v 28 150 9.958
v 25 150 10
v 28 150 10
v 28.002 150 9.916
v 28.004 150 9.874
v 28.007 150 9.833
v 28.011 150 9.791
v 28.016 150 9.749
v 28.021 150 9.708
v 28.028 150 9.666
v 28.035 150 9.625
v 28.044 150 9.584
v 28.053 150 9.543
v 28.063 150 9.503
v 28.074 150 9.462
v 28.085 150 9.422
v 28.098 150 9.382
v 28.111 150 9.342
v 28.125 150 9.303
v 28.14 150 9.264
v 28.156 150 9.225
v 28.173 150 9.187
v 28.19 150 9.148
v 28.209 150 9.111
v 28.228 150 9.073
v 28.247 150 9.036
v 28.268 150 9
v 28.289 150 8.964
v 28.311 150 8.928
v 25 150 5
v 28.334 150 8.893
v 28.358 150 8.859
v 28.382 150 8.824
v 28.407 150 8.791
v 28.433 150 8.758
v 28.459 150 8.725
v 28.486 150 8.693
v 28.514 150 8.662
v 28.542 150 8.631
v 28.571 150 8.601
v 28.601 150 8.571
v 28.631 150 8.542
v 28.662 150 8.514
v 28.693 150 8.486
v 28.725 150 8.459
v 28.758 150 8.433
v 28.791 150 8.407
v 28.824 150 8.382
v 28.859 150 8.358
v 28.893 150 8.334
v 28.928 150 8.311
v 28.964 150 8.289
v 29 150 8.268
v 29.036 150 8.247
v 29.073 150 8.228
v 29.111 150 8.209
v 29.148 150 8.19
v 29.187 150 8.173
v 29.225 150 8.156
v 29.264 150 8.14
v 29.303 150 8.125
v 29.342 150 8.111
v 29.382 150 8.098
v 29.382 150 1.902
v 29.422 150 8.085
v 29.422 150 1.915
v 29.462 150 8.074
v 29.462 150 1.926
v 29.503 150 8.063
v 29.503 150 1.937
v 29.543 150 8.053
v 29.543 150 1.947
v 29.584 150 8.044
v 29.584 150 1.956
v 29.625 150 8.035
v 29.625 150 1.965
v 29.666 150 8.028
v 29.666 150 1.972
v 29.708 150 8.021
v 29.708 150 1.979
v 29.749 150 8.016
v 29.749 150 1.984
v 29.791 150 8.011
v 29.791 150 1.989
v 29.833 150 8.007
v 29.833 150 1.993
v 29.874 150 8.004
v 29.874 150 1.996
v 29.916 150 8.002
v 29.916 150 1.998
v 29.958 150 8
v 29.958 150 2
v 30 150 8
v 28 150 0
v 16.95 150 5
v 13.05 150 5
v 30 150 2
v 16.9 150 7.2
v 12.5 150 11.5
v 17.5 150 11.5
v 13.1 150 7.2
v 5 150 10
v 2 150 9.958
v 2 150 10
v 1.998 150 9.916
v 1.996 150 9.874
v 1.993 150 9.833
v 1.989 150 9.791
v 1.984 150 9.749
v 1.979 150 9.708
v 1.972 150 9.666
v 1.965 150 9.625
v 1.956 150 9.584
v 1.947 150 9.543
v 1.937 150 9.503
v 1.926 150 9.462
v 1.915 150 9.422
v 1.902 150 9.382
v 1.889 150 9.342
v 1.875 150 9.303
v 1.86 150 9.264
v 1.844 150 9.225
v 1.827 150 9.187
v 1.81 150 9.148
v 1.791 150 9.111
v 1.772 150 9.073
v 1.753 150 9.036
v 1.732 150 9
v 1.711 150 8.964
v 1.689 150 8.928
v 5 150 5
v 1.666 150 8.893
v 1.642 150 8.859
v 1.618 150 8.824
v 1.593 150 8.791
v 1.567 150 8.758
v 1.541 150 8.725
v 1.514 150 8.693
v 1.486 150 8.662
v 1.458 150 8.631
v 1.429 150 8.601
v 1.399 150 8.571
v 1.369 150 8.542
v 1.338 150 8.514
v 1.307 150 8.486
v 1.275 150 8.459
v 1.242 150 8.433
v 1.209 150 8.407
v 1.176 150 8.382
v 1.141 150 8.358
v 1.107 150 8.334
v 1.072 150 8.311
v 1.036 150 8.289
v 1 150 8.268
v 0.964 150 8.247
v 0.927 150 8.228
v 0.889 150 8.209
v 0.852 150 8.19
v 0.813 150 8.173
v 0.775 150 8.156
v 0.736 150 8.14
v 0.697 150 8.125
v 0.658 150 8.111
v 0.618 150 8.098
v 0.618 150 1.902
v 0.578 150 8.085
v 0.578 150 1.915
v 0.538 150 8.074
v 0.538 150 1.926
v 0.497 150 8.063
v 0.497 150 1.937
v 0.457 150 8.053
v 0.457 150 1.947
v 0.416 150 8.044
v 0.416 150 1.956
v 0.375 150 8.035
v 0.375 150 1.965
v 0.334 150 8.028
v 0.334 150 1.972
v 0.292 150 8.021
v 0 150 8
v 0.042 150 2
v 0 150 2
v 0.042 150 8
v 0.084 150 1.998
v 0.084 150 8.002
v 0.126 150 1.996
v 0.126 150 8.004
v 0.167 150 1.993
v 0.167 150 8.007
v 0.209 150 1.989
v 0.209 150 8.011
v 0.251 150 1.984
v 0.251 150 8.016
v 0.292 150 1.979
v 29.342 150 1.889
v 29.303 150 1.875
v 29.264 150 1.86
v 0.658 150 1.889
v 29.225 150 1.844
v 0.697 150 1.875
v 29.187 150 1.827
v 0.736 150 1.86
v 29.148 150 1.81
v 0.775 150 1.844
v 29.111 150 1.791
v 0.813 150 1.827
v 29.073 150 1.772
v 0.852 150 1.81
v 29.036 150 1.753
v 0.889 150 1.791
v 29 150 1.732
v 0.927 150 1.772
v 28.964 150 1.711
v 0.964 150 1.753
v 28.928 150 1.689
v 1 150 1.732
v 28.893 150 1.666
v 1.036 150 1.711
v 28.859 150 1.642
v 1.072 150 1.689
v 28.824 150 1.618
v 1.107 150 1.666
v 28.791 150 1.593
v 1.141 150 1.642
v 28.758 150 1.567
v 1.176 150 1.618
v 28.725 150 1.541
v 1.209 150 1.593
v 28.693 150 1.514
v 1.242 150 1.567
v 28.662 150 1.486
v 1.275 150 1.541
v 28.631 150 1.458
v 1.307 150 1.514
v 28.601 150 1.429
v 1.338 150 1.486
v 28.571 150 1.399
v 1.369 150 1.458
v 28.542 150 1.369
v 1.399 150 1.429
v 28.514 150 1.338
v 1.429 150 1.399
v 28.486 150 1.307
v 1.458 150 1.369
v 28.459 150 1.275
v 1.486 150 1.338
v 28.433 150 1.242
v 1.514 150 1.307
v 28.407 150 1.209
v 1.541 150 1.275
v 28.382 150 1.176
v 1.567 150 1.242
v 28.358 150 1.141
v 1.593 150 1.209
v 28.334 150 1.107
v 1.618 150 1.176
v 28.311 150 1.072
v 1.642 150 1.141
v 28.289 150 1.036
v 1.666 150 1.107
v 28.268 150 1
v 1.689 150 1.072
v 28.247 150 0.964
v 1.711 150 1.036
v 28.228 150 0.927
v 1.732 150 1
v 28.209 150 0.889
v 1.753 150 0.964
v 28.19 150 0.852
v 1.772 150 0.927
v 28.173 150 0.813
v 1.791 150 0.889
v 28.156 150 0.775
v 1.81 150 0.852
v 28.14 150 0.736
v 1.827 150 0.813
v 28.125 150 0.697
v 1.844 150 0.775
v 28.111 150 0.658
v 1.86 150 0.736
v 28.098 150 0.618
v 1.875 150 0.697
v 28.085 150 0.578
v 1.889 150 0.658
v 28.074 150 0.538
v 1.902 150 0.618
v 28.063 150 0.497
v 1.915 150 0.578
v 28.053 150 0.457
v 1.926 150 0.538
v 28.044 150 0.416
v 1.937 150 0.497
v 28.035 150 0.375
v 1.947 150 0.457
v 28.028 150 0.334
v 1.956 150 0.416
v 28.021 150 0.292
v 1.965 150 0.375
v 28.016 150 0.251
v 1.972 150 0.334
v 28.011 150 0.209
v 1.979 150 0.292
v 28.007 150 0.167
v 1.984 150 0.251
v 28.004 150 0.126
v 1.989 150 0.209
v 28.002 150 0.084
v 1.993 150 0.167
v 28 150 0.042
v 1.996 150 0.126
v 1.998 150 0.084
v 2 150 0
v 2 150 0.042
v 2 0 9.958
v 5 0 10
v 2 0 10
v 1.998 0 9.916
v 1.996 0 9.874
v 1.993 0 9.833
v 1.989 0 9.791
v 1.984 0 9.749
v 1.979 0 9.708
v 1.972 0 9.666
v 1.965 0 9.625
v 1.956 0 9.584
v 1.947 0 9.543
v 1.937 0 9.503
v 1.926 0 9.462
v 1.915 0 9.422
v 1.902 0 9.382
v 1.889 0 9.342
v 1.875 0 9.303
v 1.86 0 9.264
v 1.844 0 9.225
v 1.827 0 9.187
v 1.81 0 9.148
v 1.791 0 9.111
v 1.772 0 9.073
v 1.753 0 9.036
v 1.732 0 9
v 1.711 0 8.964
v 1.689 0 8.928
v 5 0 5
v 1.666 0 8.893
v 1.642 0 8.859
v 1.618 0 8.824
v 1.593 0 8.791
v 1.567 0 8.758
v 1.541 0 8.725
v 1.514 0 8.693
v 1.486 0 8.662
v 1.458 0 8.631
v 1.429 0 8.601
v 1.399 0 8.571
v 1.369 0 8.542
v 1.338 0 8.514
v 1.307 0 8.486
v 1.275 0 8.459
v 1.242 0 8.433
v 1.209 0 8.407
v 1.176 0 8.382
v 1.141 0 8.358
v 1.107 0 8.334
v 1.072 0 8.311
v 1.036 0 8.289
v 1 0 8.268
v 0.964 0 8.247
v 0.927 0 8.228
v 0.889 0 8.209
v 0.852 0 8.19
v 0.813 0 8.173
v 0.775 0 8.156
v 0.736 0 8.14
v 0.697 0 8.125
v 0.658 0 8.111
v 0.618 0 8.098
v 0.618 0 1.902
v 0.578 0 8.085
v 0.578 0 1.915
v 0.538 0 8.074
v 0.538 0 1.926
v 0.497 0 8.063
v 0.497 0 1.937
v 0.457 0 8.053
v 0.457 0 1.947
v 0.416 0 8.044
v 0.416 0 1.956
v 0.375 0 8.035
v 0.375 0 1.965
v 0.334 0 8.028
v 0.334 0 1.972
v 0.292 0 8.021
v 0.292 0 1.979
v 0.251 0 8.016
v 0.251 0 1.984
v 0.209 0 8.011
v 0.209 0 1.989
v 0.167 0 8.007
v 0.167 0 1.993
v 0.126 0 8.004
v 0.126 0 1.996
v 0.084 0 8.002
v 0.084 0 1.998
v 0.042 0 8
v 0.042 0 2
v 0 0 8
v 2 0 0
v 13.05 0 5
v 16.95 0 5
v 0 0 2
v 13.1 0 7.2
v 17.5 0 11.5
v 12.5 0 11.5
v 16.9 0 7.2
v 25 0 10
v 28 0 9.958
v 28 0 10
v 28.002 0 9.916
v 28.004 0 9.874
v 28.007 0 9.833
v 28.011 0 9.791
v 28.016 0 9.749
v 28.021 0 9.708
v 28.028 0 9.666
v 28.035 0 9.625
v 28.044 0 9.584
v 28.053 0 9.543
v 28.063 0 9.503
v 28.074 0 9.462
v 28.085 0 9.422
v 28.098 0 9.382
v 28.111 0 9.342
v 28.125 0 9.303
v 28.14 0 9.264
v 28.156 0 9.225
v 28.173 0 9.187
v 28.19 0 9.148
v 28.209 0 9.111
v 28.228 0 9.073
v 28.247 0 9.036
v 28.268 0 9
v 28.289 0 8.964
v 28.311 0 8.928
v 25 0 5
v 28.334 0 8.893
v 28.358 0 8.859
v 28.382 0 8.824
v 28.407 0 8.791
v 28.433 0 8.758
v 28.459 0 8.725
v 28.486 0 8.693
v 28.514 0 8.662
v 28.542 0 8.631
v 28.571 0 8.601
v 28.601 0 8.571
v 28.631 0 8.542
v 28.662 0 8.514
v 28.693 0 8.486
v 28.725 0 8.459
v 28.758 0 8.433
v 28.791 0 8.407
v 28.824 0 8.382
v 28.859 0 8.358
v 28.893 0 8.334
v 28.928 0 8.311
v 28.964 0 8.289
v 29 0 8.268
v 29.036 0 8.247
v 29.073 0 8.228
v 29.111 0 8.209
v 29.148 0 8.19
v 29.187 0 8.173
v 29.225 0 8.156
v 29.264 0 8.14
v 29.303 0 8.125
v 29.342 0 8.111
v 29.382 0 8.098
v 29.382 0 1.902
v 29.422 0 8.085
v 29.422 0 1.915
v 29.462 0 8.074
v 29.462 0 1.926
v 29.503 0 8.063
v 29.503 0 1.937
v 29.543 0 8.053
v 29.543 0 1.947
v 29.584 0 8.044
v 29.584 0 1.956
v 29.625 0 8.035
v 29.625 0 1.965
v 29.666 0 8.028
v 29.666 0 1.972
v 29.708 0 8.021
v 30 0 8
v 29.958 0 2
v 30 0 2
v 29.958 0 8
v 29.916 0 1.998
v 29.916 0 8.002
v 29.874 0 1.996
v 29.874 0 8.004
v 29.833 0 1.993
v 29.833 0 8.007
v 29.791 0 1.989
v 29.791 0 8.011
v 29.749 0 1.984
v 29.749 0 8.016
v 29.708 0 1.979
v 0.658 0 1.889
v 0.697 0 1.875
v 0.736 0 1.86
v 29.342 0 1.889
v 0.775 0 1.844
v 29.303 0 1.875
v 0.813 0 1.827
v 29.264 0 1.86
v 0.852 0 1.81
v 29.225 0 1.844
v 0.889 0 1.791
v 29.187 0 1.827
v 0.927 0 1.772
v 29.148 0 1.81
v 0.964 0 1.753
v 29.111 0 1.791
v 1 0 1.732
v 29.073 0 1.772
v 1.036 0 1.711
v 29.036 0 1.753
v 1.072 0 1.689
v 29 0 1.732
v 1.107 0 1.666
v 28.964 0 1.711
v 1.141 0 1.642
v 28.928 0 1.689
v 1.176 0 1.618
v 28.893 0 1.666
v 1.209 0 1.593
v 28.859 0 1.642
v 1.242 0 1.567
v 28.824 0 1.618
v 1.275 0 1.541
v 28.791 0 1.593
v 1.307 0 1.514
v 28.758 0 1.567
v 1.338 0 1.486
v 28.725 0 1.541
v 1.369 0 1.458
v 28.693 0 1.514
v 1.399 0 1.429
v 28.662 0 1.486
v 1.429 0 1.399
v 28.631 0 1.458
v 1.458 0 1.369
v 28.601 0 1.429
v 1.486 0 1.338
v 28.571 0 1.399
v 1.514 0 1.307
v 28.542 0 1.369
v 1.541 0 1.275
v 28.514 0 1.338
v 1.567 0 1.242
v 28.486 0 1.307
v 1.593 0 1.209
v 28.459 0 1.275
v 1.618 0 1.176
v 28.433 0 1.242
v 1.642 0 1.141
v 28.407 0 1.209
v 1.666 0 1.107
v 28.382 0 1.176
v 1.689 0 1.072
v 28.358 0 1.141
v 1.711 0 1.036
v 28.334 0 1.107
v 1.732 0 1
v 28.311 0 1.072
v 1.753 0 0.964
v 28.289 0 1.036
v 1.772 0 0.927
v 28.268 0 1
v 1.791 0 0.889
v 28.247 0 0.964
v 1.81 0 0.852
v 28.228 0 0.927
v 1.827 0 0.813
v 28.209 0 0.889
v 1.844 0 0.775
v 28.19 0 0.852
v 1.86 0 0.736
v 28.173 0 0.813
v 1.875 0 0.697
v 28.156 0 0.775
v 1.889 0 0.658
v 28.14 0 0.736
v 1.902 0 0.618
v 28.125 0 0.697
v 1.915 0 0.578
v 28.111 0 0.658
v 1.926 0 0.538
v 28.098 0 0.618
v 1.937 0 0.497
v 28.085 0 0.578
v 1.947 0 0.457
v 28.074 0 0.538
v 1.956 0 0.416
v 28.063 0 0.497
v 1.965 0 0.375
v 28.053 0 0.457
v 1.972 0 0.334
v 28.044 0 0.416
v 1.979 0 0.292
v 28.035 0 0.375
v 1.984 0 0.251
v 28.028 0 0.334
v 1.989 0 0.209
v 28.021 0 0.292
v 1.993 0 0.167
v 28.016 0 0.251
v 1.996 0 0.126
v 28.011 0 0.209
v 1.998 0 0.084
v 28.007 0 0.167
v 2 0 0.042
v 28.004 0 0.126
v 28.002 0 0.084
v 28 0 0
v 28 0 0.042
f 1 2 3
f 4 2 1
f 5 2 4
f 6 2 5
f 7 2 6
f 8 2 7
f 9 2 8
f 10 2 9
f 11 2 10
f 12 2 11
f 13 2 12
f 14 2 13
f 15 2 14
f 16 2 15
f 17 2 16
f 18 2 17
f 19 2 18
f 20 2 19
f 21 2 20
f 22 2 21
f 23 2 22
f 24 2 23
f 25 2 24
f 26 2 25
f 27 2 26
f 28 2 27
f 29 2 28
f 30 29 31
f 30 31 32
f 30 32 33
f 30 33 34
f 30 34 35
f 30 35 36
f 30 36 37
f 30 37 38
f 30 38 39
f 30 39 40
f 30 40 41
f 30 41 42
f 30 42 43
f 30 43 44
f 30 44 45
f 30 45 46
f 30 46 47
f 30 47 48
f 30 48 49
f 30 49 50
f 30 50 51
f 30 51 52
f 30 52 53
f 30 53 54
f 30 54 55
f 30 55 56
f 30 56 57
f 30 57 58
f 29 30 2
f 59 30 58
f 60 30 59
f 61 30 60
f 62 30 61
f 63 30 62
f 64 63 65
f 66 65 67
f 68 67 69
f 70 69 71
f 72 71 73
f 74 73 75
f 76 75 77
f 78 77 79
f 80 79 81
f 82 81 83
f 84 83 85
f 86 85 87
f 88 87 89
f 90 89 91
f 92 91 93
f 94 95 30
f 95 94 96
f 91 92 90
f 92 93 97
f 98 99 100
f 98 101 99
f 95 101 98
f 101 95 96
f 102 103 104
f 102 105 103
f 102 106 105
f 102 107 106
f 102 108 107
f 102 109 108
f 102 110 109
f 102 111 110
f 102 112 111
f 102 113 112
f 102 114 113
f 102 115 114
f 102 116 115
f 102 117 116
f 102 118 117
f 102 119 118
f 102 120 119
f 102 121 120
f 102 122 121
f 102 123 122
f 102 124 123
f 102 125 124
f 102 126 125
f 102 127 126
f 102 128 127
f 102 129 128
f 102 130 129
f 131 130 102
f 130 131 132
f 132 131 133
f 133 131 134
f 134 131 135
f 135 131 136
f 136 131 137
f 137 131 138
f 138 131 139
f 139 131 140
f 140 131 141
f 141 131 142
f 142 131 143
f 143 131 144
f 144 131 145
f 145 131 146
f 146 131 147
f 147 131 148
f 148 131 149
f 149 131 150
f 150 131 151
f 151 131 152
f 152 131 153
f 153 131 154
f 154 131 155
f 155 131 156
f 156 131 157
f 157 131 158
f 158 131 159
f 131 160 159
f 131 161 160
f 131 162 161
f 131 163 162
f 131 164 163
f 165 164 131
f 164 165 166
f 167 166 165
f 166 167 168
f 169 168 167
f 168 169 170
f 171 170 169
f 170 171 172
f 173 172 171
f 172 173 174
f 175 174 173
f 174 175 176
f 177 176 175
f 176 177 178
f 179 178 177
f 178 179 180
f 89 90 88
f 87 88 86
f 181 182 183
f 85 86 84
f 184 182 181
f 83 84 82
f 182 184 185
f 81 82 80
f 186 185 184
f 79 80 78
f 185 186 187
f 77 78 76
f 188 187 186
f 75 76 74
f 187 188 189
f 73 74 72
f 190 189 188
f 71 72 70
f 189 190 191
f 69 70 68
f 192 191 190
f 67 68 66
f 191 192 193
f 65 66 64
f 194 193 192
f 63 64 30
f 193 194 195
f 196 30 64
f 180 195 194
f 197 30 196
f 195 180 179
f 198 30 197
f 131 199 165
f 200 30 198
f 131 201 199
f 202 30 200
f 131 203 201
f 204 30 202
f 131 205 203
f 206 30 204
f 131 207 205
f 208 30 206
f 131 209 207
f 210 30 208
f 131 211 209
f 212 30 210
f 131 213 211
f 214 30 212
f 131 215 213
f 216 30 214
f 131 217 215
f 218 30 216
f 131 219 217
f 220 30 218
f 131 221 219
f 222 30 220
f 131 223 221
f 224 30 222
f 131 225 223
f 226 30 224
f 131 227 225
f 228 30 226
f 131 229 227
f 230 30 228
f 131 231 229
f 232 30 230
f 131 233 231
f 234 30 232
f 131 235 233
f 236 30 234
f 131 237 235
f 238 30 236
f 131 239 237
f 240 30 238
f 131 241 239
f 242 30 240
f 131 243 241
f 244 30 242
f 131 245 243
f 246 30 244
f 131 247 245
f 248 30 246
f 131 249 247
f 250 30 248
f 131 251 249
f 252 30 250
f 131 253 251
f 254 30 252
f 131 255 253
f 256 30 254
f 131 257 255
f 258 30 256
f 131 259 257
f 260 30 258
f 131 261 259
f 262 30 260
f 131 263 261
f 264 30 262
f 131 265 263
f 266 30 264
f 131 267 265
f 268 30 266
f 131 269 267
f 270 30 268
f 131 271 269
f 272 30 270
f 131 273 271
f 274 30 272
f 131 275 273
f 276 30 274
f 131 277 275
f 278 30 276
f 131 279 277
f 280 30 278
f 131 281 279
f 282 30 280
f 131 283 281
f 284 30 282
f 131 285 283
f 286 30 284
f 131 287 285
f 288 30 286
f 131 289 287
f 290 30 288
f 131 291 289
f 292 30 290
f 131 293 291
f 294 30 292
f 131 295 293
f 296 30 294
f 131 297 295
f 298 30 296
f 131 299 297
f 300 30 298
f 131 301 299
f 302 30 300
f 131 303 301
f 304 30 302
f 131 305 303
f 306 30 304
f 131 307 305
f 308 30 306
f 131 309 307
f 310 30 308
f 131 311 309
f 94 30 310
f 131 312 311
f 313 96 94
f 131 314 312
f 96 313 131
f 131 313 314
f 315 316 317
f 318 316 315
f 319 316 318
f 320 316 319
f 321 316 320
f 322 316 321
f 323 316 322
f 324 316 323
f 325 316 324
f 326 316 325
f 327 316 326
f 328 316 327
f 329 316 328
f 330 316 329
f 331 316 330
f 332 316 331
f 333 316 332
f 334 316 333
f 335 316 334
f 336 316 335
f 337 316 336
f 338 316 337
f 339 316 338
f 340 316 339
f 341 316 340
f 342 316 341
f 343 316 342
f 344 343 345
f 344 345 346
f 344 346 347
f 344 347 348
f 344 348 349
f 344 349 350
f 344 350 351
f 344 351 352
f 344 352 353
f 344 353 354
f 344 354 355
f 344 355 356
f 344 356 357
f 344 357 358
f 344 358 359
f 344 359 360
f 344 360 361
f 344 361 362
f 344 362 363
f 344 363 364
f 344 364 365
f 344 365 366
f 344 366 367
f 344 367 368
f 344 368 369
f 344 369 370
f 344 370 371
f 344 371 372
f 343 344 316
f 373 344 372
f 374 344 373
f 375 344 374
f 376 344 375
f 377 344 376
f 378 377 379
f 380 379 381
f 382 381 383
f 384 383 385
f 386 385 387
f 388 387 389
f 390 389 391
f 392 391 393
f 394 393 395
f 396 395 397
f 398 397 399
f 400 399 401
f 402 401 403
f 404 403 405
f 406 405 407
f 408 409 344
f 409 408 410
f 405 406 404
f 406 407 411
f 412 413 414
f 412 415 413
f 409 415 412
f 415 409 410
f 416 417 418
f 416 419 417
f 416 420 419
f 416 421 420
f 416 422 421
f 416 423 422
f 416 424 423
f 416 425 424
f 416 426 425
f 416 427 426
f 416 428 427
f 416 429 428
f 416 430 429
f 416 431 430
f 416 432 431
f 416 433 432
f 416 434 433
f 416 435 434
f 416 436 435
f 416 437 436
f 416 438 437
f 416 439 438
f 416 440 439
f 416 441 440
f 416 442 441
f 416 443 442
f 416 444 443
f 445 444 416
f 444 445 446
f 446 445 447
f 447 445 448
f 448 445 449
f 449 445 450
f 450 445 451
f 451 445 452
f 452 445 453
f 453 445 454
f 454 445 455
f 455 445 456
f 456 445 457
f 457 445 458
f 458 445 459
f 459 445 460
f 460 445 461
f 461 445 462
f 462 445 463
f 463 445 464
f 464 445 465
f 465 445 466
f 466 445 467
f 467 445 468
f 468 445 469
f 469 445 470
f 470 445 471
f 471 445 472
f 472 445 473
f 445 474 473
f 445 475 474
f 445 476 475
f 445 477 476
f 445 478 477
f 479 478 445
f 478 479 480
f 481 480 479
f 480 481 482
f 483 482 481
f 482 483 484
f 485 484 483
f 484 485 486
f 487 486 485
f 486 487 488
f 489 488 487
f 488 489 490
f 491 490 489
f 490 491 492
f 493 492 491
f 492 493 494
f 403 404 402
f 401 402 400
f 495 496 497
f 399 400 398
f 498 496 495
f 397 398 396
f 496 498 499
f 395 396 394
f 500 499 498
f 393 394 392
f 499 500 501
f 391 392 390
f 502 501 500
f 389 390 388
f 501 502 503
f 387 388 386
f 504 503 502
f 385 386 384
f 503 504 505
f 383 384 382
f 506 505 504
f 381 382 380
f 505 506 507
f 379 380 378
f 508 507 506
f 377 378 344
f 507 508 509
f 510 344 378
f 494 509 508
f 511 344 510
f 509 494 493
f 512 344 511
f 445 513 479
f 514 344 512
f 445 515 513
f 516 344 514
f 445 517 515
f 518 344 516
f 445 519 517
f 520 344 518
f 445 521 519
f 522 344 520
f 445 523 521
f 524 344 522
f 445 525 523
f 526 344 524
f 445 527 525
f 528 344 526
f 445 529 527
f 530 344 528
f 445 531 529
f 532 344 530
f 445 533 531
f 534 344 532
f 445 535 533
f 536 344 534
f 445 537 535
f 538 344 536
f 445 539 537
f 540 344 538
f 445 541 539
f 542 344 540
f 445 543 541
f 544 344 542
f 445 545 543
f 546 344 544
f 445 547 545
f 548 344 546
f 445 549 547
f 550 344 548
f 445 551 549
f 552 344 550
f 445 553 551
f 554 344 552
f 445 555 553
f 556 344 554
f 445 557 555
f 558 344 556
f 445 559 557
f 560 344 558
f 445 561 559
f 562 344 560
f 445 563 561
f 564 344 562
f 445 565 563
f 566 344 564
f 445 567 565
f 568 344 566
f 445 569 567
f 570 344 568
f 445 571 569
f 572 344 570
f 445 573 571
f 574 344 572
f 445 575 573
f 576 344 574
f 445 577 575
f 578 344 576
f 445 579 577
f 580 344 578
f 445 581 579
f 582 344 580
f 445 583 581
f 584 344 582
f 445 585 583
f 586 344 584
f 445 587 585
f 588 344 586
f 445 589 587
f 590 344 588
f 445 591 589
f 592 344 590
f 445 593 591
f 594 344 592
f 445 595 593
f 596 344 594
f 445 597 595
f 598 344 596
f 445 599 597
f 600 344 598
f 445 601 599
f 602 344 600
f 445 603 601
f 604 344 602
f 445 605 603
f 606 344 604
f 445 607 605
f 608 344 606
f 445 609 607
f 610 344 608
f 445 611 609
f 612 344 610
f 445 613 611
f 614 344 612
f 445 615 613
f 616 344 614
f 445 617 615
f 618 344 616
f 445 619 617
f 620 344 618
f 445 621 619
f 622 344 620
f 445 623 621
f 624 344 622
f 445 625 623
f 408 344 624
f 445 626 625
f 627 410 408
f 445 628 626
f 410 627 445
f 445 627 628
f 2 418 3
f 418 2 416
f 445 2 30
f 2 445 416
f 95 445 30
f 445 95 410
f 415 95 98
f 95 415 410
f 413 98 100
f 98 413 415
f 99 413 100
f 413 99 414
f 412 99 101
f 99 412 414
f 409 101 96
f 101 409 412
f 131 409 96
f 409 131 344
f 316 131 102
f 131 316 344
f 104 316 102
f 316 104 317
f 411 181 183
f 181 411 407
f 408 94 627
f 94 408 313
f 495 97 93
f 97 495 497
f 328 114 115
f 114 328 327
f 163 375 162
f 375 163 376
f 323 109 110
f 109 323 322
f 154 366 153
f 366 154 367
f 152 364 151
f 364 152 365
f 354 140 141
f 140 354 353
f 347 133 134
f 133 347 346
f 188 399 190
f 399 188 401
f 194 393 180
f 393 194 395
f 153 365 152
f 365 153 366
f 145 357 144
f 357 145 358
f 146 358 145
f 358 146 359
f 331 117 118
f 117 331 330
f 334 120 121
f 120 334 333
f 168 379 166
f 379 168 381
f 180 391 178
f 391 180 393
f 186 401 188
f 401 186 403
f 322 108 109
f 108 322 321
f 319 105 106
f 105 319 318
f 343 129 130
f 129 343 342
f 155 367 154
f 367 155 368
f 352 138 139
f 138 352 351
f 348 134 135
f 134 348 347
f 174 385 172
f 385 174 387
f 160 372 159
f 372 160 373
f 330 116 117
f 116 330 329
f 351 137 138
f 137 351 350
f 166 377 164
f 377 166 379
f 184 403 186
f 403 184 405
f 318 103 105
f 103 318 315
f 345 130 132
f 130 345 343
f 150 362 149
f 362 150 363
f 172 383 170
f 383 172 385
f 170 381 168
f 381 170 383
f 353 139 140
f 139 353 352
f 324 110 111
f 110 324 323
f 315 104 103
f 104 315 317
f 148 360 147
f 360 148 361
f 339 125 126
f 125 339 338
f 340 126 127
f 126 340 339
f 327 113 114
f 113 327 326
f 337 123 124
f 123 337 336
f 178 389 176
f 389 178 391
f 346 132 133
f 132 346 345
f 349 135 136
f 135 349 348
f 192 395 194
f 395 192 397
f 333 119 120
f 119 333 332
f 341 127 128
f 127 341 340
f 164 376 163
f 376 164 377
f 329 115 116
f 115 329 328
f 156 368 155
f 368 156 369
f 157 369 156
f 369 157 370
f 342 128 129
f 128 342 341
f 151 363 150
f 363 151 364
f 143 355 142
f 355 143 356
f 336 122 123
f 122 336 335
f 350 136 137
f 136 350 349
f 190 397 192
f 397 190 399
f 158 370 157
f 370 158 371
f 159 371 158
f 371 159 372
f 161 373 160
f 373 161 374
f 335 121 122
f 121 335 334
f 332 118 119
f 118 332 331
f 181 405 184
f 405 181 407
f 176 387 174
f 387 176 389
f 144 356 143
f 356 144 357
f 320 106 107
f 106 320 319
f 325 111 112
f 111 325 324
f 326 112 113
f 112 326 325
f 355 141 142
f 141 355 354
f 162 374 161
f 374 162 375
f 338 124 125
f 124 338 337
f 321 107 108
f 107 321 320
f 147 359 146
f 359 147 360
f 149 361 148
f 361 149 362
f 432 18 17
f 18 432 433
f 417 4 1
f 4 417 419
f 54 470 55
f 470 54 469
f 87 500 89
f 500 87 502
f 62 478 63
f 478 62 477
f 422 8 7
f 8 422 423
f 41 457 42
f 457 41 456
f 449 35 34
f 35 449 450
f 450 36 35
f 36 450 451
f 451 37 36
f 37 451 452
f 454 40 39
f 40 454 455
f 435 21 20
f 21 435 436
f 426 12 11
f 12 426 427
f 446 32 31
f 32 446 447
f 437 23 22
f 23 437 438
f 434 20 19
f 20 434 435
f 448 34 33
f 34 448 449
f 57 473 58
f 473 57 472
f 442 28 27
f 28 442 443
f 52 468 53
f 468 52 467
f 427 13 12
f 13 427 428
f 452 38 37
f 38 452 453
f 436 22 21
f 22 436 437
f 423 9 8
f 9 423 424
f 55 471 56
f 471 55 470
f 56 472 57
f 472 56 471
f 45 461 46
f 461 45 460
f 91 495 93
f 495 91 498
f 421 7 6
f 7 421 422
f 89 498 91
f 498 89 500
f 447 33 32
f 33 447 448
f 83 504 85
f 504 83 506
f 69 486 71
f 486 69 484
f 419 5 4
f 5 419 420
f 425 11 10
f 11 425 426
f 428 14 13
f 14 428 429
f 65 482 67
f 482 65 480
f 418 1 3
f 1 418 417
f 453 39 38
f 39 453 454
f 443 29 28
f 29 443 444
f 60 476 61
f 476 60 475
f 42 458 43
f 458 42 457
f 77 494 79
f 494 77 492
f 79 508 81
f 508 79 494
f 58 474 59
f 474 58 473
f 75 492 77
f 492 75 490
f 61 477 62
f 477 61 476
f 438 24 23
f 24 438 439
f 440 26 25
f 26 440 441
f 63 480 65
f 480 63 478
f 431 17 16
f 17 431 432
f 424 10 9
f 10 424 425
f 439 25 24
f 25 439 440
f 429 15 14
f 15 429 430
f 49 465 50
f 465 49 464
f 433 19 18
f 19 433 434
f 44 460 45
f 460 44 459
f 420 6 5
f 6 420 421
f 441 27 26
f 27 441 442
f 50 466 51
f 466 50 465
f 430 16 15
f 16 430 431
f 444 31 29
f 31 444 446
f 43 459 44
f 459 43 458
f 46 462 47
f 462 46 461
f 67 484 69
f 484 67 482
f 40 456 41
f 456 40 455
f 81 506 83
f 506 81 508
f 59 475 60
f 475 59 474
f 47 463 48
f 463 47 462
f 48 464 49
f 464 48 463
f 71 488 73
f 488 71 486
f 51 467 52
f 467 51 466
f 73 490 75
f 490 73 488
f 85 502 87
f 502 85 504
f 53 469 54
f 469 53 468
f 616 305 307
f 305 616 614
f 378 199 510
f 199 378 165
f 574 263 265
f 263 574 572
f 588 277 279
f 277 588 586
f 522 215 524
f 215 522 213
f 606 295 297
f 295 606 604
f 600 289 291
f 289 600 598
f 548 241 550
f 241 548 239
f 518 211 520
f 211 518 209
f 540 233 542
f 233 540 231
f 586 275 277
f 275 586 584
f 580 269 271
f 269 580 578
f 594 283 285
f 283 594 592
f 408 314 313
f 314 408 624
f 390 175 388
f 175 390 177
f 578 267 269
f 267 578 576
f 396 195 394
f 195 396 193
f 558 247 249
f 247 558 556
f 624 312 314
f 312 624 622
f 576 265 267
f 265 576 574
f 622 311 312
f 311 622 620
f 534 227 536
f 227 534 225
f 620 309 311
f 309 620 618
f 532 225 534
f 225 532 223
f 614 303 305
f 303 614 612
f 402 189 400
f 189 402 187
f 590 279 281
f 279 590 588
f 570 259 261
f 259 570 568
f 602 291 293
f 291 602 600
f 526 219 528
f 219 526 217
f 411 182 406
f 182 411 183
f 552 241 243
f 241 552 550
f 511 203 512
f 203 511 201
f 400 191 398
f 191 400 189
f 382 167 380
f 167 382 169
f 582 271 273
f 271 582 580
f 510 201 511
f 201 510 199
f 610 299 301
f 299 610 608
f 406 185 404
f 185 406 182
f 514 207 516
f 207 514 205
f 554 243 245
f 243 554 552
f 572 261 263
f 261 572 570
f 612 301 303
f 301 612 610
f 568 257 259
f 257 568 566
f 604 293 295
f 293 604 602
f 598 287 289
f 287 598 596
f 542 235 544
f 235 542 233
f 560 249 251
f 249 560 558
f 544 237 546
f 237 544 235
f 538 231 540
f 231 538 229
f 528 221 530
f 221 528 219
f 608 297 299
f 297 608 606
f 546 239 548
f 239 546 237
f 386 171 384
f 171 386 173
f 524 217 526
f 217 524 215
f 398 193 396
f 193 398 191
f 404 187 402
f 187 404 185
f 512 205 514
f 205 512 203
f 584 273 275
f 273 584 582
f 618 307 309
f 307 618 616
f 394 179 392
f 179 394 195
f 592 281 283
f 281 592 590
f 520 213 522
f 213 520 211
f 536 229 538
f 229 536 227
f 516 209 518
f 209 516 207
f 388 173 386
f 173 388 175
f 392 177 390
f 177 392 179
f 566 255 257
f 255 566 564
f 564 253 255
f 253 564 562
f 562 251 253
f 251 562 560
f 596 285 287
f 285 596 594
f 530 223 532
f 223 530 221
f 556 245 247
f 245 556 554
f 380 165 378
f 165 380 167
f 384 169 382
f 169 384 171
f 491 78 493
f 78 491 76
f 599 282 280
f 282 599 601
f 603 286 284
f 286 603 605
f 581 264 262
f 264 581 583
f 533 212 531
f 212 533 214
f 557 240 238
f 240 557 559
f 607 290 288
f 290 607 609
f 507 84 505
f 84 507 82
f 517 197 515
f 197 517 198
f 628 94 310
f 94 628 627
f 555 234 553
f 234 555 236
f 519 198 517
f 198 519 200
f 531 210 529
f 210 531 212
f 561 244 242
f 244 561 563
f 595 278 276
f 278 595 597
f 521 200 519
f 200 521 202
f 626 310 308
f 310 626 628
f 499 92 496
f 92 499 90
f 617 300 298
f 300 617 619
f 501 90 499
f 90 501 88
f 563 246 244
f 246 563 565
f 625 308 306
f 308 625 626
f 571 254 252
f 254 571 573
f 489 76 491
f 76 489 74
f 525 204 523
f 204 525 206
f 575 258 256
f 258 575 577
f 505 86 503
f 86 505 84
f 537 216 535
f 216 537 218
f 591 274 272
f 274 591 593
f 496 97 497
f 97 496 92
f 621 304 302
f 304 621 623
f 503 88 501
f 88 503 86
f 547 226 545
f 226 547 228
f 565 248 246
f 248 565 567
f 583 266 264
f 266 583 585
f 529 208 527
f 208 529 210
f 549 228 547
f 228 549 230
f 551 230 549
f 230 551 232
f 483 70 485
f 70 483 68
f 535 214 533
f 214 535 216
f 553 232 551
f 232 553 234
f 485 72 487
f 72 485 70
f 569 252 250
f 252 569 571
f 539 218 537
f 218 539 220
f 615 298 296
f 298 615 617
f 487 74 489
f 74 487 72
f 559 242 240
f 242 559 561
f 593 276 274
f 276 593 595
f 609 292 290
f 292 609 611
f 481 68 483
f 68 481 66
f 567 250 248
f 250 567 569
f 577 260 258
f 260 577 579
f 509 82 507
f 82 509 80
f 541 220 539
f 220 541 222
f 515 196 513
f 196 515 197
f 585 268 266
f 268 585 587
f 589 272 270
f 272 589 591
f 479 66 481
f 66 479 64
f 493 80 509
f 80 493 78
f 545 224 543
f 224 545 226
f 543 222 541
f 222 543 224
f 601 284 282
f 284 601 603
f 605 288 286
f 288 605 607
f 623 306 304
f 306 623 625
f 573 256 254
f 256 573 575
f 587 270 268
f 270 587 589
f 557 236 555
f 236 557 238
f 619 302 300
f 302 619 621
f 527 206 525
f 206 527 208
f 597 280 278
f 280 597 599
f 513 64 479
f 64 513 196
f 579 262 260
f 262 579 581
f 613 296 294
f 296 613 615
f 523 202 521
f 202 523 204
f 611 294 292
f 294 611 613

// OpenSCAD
module xrail() {
module rail1(){

linear_extrude(height = 150, center = false, convexity = 10, twist = 0)
polygon ([[0,10],[0,0],[30,0],[30,10],[25,10],[25,5],[16.95,5],[16.90,7.2],[17.5,11.5],[12.5,11.5],[13.10,7.2],[13.05,5],[5,5],[5,10]]);


};
difference() {
rail1();
translate([0,10,-1]) cylinder(r=2, h=152, $fn=300);
translate([30,10,-1]) cylinder(r=2, h=152, $fn=300);
translate([0,0,-1]) cylinder(r=2, h=152, $fn=300);
translate([30,0,-1]) cylinder(r=2, h=6152, $fn=300);
}
}
translate([0,150,0])rotate([90,0,0])xrail();
